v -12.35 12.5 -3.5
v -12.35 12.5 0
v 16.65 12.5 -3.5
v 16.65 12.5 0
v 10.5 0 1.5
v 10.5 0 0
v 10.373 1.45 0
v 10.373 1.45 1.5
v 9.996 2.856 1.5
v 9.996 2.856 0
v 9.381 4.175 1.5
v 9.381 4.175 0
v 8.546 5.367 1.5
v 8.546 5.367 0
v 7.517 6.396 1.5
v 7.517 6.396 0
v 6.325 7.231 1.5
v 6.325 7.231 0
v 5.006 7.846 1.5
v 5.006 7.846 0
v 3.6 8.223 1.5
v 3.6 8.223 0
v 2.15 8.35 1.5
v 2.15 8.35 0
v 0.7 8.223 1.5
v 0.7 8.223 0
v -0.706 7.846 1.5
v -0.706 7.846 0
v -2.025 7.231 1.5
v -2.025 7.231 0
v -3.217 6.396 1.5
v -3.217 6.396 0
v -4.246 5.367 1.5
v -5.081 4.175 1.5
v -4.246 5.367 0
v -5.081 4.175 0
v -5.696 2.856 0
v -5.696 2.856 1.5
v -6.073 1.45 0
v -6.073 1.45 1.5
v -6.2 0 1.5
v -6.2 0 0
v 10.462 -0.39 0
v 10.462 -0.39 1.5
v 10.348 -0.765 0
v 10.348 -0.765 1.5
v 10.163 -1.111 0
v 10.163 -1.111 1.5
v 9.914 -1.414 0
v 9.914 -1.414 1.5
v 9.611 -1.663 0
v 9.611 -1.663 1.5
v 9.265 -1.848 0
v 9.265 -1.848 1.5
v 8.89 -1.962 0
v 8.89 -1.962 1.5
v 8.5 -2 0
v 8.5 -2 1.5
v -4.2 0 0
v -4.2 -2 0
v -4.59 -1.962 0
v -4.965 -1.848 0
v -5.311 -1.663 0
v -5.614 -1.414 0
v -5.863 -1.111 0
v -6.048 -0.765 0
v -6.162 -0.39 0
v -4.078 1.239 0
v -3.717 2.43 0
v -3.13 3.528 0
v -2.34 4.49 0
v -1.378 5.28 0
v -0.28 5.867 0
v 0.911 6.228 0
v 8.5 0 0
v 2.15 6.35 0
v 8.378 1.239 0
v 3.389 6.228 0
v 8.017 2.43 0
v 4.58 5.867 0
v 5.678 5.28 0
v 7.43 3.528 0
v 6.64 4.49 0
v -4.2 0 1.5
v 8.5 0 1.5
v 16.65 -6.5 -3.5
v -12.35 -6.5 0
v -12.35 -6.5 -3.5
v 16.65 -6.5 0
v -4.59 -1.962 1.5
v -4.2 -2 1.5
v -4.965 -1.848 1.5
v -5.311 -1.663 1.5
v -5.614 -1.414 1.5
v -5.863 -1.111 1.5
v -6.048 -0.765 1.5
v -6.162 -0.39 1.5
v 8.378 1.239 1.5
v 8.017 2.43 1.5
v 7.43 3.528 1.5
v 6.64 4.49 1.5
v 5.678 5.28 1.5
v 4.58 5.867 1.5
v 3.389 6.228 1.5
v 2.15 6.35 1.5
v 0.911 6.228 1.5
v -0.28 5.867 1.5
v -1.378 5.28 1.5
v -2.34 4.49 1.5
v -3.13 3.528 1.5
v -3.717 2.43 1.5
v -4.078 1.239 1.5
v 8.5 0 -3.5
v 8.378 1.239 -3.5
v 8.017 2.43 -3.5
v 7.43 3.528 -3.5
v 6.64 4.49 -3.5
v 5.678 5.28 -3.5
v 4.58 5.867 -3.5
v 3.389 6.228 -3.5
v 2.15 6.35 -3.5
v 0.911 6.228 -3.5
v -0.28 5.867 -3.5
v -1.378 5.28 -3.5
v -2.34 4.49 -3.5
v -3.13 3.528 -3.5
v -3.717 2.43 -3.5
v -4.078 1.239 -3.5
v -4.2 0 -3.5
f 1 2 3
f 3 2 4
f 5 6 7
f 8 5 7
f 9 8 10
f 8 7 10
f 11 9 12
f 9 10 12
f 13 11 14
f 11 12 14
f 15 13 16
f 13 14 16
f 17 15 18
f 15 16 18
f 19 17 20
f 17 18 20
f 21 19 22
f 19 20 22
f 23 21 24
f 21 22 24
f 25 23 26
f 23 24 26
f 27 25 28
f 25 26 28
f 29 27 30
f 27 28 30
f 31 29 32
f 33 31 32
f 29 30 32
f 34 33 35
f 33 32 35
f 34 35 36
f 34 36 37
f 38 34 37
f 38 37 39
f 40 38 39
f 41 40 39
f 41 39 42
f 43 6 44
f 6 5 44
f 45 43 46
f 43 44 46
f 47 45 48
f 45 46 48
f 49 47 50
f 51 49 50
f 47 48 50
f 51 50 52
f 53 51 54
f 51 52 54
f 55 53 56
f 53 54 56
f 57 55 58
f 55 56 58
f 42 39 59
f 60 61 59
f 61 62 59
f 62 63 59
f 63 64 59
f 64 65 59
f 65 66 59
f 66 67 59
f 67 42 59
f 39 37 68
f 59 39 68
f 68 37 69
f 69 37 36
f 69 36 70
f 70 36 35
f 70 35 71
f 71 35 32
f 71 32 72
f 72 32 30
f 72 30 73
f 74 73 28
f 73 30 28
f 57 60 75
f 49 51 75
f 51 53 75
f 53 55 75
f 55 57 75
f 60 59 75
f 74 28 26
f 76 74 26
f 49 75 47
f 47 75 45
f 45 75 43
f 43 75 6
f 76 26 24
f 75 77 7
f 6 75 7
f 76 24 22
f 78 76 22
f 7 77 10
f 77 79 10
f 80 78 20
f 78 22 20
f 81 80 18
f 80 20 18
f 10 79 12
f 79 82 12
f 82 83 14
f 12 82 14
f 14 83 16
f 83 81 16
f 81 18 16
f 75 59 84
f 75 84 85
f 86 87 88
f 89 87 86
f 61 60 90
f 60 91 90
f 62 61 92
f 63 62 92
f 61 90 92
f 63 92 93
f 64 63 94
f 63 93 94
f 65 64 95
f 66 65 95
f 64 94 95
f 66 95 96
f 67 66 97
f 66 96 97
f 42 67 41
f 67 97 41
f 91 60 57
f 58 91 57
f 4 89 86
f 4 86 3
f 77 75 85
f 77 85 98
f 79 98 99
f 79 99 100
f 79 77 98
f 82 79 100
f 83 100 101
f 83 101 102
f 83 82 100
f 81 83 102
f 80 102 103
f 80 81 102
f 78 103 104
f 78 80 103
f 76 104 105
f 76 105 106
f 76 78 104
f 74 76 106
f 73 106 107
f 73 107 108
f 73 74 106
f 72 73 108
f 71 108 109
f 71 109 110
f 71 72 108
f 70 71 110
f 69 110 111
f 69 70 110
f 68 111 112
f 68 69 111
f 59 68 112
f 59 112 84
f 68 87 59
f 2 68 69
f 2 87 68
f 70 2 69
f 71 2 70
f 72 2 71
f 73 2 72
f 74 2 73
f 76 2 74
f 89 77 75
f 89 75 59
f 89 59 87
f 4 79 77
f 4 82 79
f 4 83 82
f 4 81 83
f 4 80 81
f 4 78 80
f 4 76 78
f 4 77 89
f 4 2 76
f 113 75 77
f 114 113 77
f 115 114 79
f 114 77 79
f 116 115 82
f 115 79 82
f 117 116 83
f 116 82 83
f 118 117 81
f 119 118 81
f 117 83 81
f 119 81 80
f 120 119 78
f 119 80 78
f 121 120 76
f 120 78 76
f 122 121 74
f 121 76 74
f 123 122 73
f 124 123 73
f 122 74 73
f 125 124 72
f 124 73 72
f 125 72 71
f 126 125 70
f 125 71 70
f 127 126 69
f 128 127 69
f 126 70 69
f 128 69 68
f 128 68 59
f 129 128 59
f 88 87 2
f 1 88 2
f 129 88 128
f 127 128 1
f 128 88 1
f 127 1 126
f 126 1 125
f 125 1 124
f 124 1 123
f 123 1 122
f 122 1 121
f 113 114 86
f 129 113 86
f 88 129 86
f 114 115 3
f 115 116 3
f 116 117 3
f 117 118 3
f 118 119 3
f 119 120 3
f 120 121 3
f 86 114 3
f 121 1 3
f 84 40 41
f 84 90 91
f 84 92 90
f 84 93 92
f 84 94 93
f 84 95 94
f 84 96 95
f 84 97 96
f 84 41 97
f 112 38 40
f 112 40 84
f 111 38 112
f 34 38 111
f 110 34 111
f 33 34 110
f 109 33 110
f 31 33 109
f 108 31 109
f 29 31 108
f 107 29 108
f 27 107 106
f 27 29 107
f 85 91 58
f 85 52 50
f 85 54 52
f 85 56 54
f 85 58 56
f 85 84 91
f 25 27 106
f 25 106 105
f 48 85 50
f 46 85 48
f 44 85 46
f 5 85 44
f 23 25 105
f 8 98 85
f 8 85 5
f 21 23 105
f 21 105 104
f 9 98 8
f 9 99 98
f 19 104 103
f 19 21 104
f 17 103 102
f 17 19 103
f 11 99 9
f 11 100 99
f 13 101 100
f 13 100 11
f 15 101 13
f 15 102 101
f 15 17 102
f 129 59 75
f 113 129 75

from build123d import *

# Parameters (mm, degrees)
CAP_ALIGNMENT_LIP_DEPTH = 1.5
SKETCH1_3_W             = 29
SKETCH1_3_H             = 19
CAP_BODY_DEPTH          = 3.5
LIP_CORNER_FILLET_R     = 2


with BuildPart() as part:
    # Sketch1 → cap alignment lip (new body)
    with BuildSketch(Plane.XY):
        with BuildLine():
            Line((10.5, -2), (10.5, 0))
            ThreePointArc((10.5, 0), (2.15, 8.35), (-6.2, 0))
            Line((-6.2, 0), (-6.2, -2))
            Line((-6.2, -2), (10.5, -2))
        make_face()
        with BuildLine():
            ThreePointArc((8.5, 0), (2.15, 6.35), (-4.2, 0))
            Line((-4.2, 0), (8.5, 0))
        make_face(mode=Mode.SUBTRACT)
    extrude(amount=CAP_ALIGNMENT_LIP_DEPTH)

    # lip corner fillet
    lip_corner_fillet_edges = [part.edges().sort_by_distance(p)[0] for p in [
        (-6.2, -2, 0.75),
        (10.5, -2, 0.75),
    ]]
    fillet(lip_corner_fillet_edges, radius=LIP_CORNER_FILLET_R - 0.0001)  # a hair under: the kernel refuses the full size


with BuildPart() as body_2:
    # Sketch1<3> → cap body (new body)
    # profile 1 of 2: a face of its own
    with BuildSketch(Plane.XY):
        with Locations((2.15, 3)):
            Rectangle(SKETCH1_3_W, SKETCH1_3_H)
        with BuildLine():
            ThreePointArc((10.5, 0), (2.15, 8.35), (-6.2, 0))
            Line((-6.2, 0), (-6.2, -2))
            Line((-6.2, -2), (10.5, -2))
            Line((10.5, -2), (10.5, 0))
        make_face(mode=Mode.SUBTRACT)
    # profile 2 of 2: a face of its own
    with BuildSketch(Plane.XY):
        with BuildLine():
            Line((10.5, -2), (10.5, 0))
            ThreePointArc((10.5, 0), (2.15, 8.35), (-6.2, 0))
            Line((-6.2, 0), (-6.2, -2))
            Line((-6.2, -2), (10.5, -2))
        make_face()
        with BuildLine():
            ThreePointArc((8.5, 0), (2.15, 6.35), (-4.2, 0))
            Line((-4.2, 0), (8.5, 0))
        make_face(mode=Mode.SUBTRACT)
    extrude(amount=-CAP_BODY_DEPTH)


solid = Compound([part.part, body_2.part])
